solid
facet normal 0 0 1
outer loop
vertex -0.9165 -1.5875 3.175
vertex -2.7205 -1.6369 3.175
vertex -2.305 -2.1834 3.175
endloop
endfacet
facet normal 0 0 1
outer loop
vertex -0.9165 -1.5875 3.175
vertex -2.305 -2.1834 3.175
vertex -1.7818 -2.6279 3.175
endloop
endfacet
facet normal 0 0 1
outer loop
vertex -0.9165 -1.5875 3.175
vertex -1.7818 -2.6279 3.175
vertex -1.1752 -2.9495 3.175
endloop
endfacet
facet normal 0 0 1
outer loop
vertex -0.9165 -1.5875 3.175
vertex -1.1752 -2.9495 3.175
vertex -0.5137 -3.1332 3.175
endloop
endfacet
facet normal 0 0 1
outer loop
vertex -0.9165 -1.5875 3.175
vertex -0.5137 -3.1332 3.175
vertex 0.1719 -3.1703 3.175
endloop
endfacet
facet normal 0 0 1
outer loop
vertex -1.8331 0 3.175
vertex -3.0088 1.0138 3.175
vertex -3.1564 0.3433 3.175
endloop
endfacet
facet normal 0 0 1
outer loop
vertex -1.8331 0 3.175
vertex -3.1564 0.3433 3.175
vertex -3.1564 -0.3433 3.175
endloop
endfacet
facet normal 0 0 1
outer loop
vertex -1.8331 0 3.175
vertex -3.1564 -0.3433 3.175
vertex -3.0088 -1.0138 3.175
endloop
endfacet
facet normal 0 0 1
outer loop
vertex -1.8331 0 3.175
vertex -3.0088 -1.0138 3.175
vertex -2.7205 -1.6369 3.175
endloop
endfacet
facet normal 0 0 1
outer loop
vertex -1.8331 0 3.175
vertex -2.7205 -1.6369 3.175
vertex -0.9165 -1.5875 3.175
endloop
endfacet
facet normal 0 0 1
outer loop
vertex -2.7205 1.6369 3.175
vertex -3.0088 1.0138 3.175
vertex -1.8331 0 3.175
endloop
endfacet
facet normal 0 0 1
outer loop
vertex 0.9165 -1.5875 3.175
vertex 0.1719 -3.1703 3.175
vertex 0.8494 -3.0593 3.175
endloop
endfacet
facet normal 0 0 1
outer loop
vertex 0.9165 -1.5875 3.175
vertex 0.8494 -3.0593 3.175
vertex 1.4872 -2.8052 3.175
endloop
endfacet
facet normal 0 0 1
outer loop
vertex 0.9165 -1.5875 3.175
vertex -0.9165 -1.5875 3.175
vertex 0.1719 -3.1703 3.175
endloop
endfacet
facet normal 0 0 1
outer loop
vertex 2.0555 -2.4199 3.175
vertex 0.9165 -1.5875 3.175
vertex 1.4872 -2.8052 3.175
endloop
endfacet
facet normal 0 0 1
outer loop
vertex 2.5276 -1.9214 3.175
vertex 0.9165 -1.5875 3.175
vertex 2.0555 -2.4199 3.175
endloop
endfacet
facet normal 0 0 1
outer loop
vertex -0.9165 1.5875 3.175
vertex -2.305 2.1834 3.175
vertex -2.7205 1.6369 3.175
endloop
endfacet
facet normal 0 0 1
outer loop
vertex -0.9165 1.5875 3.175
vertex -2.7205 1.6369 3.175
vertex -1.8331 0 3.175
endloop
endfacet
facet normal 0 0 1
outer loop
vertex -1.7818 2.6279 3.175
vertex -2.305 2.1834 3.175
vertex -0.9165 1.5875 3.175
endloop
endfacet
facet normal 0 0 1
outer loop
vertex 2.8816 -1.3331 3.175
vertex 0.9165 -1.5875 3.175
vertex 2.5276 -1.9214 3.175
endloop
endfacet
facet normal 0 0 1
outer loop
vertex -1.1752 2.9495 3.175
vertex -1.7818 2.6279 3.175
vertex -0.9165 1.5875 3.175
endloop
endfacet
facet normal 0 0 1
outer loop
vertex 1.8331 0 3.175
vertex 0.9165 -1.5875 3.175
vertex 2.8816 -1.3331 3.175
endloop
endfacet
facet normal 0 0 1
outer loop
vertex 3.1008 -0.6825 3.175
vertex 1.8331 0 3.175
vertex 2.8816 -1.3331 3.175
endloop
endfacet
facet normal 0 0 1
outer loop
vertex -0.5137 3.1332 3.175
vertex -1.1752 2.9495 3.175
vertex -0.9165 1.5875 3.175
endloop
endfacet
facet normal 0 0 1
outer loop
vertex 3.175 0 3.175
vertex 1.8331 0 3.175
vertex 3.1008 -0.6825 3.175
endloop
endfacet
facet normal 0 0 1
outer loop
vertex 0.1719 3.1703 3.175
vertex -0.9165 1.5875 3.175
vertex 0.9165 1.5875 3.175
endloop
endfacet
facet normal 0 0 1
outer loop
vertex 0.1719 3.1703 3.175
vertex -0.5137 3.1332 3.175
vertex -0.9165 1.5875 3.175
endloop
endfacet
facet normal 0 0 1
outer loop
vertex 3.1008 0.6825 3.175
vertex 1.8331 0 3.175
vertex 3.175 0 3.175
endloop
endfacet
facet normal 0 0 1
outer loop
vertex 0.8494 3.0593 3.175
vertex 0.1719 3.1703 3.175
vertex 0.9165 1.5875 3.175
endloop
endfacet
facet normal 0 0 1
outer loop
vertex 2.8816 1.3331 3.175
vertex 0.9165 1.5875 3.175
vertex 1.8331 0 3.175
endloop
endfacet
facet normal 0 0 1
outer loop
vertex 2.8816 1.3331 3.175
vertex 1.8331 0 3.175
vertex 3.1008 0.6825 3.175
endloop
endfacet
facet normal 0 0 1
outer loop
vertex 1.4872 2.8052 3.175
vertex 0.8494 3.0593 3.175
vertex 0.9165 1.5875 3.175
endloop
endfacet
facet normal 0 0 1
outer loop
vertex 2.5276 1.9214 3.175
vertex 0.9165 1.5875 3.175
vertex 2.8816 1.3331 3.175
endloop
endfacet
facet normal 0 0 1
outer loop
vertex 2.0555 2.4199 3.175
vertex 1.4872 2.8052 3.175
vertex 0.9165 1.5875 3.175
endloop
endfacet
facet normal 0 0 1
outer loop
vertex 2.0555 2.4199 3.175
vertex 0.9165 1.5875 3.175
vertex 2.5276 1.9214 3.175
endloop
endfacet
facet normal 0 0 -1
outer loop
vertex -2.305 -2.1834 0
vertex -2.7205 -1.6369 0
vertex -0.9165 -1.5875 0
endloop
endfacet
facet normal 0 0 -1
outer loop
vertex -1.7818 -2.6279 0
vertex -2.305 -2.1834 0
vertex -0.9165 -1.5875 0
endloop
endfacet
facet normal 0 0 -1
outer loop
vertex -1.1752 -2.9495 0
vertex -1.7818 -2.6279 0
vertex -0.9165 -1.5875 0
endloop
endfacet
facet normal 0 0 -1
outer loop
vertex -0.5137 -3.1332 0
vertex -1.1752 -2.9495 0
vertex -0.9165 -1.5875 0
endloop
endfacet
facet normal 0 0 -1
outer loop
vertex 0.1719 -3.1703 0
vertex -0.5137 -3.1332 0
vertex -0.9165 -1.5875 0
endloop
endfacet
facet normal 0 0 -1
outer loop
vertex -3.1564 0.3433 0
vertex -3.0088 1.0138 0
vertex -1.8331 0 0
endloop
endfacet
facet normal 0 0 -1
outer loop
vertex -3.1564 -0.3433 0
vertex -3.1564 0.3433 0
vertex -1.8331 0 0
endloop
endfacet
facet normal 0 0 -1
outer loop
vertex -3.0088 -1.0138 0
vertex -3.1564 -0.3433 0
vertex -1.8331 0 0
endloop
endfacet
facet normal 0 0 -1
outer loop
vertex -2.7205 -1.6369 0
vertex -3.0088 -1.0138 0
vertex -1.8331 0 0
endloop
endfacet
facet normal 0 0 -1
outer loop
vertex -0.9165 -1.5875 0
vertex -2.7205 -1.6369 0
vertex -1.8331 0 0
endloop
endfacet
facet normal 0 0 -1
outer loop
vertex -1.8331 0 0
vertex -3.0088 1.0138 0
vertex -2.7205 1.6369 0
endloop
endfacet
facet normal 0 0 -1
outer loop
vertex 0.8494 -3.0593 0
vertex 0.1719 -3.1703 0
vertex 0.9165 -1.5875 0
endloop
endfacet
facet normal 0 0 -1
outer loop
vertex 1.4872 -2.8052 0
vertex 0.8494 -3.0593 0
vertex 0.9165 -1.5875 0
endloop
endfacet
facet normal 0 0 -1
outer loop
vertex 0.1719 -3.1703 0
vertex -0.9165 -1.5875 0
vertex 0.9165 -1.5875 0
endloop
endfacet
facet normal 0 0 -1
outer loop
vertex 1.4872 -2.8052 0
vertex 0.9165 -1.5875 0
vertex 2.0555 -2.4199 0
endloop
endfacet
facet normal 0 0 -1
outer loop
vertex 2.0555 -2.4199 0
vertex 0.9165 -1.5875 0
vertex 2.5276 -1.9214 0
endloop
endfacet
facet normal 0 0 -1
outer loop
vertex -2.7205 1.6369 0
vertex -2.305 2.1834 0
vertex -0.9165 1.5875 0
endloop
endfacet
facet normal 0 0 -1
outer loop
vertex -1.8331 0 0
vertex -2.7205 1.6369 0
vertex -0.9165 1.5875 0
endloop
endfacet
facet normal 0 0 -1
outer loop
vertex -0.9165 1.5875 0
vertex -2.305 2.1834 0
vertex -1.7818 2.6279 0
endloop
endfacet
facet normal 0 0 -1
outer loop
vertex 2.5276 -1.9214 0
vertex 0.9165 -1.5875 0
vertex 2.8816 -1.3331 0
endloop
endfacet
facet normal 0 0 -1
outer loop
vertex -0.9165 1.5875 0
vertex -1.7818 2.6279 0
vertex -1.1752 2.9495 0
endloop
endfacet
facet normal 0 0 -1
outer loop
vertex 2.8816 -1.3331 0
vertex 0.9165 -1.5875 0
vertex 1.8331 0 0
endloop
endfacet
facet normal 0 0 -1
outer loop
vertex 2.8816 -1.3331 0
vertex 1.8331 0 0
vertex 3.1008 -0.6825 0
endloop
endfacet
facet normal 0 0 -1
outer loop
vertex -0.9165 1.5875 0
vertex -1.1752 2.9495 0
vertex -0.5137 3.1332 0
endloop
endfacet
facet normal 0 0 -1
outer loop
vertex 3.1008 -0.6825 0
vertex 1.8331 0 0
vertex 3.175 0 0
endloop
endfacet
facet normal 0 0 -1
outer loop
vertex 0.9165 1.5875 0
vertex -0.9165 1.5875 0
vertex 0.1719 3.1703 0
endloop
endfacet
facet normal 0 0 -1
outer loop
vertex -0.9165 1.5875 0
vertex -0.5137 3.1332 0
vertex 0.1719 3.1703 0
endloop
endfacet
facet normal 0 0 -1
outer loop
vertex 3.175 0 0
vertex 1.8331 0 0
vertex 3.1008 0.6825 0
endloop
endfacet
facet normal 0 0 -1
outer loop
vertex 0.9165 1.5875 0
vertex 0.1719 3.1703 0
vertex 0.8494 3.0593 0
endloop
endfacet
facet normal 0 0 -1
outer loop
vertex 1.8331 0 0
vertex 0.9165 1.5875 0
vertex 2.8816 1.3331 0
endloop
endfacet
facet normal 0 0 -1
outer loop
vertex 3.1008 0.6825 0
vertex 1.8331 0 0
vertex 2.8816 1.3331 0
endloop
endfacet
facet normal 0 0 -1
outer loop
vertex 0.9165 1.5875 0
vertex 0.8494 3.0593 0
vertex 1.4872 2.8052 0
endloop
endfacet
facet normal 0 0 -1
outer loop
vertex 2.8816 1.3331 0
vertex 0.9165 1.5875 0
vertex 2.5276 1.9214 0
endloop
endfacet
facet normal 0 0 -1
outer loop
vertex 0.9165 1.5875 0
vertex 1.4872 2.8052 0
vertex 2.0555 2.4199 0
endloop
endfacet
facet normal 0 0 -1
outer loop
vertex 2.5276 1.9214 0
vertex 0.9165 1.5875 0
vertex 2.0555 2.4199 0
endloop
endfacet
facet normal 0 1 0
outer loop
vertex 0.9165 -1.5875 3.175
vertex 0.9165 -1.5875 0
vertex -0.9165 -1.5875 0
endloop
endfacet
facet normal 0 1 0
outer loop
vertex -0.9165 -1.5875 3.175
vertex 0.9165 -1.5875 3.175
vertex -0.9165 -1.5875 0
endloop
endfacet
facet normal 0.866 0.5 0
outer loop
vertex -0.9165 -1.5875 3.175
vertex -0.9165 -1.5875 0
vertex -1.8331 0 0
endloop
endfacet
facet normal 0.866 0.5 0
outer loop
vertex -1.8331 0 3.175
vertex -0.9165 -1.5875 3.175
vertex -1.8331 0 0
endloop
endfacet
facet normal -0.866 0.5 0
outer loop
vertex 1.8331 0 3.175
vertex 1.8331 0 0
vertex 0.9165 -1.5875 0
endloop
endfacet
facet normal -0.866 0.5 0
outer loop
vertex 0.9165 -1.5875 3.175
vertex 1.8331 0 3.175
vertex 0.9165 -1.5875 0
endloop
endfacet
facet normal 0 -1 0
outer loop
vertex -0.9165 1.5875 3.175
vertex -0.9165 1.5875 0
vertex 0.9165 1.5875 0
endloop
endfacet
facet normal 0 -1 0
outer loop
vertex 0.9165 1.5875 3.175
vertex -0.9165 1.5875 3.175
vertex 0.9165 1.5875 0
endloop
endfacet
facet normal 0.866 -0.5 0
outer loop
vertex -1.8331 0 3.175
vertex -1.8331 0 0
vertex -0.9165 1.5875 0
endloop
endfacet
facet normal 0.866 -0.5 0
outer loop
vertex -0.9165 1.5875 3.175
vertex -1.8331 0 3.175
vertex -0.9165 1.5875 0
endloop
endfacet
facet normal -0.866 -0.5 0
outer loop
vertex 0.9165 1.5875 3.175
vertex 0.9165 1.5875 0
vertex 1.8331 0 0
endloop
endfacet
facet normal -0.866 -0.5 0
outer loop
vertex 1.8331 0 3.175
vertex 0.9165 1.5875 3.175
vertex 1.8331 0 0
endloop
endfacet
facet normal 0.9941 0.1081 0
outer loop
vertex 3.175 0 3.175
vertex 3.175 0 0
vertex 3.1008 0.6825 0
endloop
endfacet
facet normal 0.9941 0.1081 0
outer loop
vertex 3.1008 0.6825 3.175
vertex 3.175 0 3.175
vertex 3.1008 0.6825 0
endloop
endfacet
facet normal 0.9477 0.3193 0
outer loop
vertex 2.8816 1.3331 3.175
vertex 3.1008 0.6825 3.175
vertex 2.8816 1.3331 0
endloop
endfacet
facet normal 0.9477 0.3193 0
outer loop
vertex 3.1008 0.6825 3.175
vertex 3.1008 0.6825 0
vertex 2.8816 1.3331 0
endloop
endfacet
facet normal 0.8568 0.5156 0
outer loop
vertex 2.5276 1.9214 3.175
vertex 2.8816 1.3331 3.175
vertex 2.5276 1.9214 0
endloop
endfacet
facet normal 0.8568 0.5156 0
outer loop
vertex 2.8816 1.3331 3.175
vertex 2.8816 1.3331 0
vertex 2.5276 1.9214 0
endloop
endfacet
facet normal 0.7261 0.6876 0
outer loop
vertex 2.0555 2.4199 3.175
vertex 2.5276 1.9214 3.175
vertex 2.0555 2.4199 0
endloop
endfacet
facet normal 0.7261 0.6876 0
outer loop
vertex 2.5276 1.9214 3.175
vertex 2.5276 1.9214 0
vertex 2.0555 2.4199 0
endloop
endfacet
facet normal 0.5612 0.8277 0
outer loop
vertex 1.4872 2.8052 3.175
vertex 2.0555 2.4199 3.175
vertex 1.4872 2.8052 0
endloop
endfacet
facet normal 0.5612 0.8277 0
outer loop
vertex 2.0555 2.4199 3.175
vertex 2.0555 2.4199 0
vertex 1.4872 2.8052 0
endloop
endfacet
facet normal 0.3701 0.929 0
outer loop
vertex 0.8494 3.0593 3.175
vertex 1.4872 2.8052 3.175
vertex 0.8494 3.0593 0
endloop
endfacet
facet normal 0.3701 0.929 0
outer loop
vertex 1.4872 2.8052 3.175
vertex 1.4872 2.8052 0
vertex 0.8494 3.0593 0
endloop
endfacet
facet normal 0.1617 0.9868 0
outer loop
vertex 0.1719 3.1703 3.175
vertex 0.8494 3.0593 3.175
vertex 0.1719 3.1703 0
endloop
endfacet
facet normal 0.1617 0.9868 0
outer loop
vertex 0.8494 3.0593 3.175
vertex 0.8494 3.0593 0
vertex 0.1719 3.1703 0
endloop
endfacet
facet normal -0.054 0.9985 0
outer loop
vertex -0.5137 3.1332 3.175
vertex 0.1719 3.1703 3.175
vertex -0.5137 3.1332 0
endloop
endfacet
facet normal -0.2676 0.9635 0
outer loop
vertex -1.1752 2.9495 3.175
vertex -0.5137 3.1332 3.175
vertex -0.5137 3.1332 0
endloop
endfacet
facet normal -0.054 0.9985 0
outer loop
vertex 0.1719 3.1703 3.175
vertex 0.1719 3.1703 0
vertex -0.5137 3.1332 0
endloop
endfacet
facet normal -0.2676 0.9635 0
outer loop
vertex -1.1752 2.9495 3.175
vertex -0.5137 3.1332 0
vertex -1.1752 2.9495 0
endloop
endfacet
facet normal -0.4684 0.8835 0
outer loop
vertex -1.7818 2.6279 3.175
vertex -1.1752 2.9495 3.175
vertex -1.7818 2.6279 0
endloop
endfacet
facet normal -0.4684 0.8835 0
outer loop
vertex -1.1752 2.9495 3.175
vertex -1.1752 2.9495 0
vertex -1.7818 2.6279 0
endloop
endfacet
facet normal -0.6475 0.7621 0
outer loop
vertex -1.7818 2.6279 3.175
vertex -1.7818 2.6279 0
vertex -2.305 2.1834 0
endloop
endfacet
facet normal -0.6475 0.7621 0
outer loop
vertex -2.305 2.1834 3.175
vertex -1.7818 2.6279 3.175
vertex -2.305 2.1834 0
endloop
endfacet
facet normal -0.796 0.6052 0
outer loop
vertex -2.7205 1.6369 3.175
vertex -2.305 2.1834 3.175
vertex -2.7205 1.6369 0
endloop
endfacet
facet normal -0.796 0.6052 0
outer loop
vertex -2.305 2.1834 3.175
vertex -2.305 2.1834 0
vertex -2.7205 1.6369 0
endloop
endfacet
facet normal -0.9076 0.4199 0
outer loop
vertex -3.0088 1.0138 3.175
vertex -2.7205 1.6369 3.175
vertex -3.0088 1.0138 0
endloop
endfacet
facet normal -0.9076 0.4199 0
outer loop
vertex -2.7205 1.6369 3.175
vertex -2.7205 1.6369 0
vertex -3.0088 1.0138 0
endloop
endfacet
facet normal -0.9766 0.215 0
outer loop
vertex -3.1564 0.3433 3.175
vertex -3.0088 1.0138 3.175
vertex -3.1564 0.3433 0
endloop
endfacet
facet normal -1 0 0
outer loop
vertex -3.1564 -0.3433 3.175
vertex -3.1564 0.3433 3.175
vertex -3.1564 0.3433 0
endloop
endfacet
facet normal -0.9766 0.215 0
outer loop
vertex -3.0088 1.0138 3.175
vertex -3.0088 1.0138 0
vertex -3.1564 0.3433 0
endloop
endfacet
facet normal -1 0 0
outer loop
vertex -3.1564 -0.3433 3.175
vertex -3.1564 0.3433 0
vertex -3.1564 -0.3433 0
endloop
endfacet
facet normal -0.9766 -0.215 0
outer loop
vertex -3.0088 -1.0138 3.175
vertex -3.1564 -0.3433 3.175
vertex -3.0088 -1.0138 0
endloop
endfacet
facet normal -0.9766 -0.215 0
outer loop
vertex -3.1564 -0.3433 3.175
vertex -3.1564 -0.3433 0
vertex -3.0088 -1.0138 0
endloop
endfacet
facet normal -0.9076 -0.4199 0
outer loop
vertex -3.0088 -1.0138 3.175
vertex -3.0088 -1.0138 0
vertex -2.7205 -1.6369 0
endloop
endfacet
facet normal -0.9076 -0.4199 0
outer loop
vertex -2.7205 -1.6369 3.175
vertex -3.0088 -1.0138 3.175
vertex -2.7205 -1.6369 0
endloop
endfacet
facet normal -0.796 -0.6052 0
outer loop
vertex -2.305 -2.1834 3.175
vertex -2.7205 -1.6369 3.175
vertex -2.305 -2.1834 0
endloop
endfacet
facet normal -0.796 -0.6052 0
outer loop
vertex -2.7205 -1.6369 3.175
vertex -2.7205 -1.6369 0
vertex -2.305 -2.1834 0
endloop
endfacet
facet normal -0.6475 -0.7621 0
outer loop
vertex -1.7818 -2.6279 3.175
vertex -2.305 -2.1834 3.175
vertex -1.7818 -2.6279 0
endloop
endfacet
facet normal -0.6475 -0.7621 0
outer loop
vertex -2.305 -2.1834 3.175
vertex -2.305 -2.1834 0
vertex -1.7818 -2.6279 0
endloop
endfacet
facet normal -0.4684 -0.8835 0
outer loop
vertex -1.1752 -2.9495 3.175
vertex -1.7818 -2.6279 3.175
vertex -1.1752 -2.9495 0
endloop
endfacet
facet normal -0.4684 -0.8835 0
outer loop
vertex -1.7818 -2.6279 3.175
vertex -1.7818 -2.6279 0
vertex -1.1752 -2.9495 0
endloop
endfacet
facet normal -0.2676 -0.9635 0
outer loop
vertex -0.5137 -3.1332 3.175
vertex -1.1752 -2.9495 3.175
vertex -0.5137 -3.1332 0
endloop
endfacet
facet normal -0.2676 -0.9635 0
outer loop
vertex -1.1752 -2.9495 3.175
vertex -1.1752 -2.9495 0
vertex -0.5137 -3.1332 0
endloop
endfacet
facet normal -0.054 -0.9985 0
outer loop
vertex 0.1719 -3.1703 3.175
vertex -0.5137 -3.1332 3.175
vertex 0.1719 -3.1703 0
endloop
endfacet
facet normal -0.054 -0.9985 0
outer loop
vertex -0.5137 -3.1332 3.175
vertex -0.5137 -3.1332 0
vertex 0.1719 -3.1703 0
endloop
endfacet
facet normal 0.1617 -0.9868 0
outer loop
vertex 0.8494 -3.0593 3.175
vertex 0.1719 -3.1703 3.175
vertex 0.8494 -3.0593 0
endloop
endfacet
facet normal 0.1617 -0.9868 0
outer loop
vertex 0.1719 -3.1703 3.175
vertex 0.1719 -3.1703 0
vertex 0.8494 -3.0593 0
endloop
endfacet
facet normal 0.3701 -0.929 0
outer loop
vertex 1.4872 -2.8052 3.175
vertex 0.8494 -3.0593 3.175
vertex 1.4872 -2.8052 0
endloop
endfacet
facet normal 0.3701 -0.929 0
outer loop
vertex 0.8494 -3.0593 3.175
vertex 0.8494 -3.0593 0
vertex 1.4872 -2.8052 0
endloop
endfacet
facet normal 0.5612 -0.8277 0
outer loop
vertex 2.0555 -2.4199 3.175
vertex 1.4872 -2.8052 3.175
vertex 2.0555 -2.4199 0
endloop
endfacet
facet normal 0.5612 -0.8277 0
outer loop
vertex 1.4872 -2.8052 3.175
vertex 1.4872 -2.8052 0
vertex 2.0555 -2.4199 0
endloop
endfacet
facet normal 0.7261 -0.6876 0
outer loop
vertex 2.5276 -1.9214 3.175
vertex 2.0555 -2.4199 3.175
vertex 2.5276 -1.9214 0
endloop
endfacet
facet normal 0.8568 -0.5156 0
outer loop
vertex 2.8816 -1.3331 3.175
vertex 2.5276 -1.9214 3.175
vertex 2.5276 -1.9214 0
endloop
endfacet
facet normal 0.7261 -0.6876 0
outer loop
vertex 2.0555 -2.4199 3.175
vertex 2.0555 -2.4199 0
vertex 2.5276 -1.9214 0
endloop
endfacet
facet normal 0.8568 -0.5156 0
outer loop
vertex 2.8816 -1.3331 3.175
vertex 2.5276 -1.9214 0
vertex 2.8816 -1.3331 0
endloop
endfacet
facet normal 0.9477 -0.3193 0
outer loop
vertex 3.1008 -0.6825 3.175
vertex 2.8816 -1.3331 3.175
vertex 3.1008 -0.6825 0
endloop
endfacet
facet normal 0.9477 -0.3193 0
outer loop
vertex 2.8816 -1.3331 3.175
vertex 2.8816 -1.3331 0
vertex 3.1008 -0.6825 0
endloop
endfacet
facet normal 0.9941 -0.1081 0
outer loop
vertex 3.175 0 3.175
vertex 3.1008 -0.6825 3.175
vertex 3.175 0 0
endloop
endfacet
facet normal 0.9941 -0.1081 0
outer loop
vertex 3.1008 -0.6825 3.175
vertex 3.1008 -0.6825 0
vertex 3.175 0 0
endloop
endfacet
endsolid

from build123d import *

# Parameters (mm, degrees)
F0_R     = 3.175
F1_DEPTH = 3.175
F2_R     = 1.5875
F3_DEPTH = 34.925


with BuildPart() as f1:
    # F0 (on Top) → F1 (new body)
    with BuildSketch(Plane.XY):
        Circle(F0_R)
        Polygon((-1.833087, 0), (-0.916544, 1.5875), (0.916544, 1.5875), (1.833087, 0), (0.916544, -1.5875), (-0.916544, -1.5875), align=None, mode=Mode.SUBTRACT)
    extrude(amount=F1_DEPTH)

    # F2 (on Top) → F3 (cut)
    with BuildSketch(Plane.XY):
        Circle(F2_R)
    extrude(amount=-F3_DEPTH, mode=Mode.SUBTRACT)


solid = f1.part
